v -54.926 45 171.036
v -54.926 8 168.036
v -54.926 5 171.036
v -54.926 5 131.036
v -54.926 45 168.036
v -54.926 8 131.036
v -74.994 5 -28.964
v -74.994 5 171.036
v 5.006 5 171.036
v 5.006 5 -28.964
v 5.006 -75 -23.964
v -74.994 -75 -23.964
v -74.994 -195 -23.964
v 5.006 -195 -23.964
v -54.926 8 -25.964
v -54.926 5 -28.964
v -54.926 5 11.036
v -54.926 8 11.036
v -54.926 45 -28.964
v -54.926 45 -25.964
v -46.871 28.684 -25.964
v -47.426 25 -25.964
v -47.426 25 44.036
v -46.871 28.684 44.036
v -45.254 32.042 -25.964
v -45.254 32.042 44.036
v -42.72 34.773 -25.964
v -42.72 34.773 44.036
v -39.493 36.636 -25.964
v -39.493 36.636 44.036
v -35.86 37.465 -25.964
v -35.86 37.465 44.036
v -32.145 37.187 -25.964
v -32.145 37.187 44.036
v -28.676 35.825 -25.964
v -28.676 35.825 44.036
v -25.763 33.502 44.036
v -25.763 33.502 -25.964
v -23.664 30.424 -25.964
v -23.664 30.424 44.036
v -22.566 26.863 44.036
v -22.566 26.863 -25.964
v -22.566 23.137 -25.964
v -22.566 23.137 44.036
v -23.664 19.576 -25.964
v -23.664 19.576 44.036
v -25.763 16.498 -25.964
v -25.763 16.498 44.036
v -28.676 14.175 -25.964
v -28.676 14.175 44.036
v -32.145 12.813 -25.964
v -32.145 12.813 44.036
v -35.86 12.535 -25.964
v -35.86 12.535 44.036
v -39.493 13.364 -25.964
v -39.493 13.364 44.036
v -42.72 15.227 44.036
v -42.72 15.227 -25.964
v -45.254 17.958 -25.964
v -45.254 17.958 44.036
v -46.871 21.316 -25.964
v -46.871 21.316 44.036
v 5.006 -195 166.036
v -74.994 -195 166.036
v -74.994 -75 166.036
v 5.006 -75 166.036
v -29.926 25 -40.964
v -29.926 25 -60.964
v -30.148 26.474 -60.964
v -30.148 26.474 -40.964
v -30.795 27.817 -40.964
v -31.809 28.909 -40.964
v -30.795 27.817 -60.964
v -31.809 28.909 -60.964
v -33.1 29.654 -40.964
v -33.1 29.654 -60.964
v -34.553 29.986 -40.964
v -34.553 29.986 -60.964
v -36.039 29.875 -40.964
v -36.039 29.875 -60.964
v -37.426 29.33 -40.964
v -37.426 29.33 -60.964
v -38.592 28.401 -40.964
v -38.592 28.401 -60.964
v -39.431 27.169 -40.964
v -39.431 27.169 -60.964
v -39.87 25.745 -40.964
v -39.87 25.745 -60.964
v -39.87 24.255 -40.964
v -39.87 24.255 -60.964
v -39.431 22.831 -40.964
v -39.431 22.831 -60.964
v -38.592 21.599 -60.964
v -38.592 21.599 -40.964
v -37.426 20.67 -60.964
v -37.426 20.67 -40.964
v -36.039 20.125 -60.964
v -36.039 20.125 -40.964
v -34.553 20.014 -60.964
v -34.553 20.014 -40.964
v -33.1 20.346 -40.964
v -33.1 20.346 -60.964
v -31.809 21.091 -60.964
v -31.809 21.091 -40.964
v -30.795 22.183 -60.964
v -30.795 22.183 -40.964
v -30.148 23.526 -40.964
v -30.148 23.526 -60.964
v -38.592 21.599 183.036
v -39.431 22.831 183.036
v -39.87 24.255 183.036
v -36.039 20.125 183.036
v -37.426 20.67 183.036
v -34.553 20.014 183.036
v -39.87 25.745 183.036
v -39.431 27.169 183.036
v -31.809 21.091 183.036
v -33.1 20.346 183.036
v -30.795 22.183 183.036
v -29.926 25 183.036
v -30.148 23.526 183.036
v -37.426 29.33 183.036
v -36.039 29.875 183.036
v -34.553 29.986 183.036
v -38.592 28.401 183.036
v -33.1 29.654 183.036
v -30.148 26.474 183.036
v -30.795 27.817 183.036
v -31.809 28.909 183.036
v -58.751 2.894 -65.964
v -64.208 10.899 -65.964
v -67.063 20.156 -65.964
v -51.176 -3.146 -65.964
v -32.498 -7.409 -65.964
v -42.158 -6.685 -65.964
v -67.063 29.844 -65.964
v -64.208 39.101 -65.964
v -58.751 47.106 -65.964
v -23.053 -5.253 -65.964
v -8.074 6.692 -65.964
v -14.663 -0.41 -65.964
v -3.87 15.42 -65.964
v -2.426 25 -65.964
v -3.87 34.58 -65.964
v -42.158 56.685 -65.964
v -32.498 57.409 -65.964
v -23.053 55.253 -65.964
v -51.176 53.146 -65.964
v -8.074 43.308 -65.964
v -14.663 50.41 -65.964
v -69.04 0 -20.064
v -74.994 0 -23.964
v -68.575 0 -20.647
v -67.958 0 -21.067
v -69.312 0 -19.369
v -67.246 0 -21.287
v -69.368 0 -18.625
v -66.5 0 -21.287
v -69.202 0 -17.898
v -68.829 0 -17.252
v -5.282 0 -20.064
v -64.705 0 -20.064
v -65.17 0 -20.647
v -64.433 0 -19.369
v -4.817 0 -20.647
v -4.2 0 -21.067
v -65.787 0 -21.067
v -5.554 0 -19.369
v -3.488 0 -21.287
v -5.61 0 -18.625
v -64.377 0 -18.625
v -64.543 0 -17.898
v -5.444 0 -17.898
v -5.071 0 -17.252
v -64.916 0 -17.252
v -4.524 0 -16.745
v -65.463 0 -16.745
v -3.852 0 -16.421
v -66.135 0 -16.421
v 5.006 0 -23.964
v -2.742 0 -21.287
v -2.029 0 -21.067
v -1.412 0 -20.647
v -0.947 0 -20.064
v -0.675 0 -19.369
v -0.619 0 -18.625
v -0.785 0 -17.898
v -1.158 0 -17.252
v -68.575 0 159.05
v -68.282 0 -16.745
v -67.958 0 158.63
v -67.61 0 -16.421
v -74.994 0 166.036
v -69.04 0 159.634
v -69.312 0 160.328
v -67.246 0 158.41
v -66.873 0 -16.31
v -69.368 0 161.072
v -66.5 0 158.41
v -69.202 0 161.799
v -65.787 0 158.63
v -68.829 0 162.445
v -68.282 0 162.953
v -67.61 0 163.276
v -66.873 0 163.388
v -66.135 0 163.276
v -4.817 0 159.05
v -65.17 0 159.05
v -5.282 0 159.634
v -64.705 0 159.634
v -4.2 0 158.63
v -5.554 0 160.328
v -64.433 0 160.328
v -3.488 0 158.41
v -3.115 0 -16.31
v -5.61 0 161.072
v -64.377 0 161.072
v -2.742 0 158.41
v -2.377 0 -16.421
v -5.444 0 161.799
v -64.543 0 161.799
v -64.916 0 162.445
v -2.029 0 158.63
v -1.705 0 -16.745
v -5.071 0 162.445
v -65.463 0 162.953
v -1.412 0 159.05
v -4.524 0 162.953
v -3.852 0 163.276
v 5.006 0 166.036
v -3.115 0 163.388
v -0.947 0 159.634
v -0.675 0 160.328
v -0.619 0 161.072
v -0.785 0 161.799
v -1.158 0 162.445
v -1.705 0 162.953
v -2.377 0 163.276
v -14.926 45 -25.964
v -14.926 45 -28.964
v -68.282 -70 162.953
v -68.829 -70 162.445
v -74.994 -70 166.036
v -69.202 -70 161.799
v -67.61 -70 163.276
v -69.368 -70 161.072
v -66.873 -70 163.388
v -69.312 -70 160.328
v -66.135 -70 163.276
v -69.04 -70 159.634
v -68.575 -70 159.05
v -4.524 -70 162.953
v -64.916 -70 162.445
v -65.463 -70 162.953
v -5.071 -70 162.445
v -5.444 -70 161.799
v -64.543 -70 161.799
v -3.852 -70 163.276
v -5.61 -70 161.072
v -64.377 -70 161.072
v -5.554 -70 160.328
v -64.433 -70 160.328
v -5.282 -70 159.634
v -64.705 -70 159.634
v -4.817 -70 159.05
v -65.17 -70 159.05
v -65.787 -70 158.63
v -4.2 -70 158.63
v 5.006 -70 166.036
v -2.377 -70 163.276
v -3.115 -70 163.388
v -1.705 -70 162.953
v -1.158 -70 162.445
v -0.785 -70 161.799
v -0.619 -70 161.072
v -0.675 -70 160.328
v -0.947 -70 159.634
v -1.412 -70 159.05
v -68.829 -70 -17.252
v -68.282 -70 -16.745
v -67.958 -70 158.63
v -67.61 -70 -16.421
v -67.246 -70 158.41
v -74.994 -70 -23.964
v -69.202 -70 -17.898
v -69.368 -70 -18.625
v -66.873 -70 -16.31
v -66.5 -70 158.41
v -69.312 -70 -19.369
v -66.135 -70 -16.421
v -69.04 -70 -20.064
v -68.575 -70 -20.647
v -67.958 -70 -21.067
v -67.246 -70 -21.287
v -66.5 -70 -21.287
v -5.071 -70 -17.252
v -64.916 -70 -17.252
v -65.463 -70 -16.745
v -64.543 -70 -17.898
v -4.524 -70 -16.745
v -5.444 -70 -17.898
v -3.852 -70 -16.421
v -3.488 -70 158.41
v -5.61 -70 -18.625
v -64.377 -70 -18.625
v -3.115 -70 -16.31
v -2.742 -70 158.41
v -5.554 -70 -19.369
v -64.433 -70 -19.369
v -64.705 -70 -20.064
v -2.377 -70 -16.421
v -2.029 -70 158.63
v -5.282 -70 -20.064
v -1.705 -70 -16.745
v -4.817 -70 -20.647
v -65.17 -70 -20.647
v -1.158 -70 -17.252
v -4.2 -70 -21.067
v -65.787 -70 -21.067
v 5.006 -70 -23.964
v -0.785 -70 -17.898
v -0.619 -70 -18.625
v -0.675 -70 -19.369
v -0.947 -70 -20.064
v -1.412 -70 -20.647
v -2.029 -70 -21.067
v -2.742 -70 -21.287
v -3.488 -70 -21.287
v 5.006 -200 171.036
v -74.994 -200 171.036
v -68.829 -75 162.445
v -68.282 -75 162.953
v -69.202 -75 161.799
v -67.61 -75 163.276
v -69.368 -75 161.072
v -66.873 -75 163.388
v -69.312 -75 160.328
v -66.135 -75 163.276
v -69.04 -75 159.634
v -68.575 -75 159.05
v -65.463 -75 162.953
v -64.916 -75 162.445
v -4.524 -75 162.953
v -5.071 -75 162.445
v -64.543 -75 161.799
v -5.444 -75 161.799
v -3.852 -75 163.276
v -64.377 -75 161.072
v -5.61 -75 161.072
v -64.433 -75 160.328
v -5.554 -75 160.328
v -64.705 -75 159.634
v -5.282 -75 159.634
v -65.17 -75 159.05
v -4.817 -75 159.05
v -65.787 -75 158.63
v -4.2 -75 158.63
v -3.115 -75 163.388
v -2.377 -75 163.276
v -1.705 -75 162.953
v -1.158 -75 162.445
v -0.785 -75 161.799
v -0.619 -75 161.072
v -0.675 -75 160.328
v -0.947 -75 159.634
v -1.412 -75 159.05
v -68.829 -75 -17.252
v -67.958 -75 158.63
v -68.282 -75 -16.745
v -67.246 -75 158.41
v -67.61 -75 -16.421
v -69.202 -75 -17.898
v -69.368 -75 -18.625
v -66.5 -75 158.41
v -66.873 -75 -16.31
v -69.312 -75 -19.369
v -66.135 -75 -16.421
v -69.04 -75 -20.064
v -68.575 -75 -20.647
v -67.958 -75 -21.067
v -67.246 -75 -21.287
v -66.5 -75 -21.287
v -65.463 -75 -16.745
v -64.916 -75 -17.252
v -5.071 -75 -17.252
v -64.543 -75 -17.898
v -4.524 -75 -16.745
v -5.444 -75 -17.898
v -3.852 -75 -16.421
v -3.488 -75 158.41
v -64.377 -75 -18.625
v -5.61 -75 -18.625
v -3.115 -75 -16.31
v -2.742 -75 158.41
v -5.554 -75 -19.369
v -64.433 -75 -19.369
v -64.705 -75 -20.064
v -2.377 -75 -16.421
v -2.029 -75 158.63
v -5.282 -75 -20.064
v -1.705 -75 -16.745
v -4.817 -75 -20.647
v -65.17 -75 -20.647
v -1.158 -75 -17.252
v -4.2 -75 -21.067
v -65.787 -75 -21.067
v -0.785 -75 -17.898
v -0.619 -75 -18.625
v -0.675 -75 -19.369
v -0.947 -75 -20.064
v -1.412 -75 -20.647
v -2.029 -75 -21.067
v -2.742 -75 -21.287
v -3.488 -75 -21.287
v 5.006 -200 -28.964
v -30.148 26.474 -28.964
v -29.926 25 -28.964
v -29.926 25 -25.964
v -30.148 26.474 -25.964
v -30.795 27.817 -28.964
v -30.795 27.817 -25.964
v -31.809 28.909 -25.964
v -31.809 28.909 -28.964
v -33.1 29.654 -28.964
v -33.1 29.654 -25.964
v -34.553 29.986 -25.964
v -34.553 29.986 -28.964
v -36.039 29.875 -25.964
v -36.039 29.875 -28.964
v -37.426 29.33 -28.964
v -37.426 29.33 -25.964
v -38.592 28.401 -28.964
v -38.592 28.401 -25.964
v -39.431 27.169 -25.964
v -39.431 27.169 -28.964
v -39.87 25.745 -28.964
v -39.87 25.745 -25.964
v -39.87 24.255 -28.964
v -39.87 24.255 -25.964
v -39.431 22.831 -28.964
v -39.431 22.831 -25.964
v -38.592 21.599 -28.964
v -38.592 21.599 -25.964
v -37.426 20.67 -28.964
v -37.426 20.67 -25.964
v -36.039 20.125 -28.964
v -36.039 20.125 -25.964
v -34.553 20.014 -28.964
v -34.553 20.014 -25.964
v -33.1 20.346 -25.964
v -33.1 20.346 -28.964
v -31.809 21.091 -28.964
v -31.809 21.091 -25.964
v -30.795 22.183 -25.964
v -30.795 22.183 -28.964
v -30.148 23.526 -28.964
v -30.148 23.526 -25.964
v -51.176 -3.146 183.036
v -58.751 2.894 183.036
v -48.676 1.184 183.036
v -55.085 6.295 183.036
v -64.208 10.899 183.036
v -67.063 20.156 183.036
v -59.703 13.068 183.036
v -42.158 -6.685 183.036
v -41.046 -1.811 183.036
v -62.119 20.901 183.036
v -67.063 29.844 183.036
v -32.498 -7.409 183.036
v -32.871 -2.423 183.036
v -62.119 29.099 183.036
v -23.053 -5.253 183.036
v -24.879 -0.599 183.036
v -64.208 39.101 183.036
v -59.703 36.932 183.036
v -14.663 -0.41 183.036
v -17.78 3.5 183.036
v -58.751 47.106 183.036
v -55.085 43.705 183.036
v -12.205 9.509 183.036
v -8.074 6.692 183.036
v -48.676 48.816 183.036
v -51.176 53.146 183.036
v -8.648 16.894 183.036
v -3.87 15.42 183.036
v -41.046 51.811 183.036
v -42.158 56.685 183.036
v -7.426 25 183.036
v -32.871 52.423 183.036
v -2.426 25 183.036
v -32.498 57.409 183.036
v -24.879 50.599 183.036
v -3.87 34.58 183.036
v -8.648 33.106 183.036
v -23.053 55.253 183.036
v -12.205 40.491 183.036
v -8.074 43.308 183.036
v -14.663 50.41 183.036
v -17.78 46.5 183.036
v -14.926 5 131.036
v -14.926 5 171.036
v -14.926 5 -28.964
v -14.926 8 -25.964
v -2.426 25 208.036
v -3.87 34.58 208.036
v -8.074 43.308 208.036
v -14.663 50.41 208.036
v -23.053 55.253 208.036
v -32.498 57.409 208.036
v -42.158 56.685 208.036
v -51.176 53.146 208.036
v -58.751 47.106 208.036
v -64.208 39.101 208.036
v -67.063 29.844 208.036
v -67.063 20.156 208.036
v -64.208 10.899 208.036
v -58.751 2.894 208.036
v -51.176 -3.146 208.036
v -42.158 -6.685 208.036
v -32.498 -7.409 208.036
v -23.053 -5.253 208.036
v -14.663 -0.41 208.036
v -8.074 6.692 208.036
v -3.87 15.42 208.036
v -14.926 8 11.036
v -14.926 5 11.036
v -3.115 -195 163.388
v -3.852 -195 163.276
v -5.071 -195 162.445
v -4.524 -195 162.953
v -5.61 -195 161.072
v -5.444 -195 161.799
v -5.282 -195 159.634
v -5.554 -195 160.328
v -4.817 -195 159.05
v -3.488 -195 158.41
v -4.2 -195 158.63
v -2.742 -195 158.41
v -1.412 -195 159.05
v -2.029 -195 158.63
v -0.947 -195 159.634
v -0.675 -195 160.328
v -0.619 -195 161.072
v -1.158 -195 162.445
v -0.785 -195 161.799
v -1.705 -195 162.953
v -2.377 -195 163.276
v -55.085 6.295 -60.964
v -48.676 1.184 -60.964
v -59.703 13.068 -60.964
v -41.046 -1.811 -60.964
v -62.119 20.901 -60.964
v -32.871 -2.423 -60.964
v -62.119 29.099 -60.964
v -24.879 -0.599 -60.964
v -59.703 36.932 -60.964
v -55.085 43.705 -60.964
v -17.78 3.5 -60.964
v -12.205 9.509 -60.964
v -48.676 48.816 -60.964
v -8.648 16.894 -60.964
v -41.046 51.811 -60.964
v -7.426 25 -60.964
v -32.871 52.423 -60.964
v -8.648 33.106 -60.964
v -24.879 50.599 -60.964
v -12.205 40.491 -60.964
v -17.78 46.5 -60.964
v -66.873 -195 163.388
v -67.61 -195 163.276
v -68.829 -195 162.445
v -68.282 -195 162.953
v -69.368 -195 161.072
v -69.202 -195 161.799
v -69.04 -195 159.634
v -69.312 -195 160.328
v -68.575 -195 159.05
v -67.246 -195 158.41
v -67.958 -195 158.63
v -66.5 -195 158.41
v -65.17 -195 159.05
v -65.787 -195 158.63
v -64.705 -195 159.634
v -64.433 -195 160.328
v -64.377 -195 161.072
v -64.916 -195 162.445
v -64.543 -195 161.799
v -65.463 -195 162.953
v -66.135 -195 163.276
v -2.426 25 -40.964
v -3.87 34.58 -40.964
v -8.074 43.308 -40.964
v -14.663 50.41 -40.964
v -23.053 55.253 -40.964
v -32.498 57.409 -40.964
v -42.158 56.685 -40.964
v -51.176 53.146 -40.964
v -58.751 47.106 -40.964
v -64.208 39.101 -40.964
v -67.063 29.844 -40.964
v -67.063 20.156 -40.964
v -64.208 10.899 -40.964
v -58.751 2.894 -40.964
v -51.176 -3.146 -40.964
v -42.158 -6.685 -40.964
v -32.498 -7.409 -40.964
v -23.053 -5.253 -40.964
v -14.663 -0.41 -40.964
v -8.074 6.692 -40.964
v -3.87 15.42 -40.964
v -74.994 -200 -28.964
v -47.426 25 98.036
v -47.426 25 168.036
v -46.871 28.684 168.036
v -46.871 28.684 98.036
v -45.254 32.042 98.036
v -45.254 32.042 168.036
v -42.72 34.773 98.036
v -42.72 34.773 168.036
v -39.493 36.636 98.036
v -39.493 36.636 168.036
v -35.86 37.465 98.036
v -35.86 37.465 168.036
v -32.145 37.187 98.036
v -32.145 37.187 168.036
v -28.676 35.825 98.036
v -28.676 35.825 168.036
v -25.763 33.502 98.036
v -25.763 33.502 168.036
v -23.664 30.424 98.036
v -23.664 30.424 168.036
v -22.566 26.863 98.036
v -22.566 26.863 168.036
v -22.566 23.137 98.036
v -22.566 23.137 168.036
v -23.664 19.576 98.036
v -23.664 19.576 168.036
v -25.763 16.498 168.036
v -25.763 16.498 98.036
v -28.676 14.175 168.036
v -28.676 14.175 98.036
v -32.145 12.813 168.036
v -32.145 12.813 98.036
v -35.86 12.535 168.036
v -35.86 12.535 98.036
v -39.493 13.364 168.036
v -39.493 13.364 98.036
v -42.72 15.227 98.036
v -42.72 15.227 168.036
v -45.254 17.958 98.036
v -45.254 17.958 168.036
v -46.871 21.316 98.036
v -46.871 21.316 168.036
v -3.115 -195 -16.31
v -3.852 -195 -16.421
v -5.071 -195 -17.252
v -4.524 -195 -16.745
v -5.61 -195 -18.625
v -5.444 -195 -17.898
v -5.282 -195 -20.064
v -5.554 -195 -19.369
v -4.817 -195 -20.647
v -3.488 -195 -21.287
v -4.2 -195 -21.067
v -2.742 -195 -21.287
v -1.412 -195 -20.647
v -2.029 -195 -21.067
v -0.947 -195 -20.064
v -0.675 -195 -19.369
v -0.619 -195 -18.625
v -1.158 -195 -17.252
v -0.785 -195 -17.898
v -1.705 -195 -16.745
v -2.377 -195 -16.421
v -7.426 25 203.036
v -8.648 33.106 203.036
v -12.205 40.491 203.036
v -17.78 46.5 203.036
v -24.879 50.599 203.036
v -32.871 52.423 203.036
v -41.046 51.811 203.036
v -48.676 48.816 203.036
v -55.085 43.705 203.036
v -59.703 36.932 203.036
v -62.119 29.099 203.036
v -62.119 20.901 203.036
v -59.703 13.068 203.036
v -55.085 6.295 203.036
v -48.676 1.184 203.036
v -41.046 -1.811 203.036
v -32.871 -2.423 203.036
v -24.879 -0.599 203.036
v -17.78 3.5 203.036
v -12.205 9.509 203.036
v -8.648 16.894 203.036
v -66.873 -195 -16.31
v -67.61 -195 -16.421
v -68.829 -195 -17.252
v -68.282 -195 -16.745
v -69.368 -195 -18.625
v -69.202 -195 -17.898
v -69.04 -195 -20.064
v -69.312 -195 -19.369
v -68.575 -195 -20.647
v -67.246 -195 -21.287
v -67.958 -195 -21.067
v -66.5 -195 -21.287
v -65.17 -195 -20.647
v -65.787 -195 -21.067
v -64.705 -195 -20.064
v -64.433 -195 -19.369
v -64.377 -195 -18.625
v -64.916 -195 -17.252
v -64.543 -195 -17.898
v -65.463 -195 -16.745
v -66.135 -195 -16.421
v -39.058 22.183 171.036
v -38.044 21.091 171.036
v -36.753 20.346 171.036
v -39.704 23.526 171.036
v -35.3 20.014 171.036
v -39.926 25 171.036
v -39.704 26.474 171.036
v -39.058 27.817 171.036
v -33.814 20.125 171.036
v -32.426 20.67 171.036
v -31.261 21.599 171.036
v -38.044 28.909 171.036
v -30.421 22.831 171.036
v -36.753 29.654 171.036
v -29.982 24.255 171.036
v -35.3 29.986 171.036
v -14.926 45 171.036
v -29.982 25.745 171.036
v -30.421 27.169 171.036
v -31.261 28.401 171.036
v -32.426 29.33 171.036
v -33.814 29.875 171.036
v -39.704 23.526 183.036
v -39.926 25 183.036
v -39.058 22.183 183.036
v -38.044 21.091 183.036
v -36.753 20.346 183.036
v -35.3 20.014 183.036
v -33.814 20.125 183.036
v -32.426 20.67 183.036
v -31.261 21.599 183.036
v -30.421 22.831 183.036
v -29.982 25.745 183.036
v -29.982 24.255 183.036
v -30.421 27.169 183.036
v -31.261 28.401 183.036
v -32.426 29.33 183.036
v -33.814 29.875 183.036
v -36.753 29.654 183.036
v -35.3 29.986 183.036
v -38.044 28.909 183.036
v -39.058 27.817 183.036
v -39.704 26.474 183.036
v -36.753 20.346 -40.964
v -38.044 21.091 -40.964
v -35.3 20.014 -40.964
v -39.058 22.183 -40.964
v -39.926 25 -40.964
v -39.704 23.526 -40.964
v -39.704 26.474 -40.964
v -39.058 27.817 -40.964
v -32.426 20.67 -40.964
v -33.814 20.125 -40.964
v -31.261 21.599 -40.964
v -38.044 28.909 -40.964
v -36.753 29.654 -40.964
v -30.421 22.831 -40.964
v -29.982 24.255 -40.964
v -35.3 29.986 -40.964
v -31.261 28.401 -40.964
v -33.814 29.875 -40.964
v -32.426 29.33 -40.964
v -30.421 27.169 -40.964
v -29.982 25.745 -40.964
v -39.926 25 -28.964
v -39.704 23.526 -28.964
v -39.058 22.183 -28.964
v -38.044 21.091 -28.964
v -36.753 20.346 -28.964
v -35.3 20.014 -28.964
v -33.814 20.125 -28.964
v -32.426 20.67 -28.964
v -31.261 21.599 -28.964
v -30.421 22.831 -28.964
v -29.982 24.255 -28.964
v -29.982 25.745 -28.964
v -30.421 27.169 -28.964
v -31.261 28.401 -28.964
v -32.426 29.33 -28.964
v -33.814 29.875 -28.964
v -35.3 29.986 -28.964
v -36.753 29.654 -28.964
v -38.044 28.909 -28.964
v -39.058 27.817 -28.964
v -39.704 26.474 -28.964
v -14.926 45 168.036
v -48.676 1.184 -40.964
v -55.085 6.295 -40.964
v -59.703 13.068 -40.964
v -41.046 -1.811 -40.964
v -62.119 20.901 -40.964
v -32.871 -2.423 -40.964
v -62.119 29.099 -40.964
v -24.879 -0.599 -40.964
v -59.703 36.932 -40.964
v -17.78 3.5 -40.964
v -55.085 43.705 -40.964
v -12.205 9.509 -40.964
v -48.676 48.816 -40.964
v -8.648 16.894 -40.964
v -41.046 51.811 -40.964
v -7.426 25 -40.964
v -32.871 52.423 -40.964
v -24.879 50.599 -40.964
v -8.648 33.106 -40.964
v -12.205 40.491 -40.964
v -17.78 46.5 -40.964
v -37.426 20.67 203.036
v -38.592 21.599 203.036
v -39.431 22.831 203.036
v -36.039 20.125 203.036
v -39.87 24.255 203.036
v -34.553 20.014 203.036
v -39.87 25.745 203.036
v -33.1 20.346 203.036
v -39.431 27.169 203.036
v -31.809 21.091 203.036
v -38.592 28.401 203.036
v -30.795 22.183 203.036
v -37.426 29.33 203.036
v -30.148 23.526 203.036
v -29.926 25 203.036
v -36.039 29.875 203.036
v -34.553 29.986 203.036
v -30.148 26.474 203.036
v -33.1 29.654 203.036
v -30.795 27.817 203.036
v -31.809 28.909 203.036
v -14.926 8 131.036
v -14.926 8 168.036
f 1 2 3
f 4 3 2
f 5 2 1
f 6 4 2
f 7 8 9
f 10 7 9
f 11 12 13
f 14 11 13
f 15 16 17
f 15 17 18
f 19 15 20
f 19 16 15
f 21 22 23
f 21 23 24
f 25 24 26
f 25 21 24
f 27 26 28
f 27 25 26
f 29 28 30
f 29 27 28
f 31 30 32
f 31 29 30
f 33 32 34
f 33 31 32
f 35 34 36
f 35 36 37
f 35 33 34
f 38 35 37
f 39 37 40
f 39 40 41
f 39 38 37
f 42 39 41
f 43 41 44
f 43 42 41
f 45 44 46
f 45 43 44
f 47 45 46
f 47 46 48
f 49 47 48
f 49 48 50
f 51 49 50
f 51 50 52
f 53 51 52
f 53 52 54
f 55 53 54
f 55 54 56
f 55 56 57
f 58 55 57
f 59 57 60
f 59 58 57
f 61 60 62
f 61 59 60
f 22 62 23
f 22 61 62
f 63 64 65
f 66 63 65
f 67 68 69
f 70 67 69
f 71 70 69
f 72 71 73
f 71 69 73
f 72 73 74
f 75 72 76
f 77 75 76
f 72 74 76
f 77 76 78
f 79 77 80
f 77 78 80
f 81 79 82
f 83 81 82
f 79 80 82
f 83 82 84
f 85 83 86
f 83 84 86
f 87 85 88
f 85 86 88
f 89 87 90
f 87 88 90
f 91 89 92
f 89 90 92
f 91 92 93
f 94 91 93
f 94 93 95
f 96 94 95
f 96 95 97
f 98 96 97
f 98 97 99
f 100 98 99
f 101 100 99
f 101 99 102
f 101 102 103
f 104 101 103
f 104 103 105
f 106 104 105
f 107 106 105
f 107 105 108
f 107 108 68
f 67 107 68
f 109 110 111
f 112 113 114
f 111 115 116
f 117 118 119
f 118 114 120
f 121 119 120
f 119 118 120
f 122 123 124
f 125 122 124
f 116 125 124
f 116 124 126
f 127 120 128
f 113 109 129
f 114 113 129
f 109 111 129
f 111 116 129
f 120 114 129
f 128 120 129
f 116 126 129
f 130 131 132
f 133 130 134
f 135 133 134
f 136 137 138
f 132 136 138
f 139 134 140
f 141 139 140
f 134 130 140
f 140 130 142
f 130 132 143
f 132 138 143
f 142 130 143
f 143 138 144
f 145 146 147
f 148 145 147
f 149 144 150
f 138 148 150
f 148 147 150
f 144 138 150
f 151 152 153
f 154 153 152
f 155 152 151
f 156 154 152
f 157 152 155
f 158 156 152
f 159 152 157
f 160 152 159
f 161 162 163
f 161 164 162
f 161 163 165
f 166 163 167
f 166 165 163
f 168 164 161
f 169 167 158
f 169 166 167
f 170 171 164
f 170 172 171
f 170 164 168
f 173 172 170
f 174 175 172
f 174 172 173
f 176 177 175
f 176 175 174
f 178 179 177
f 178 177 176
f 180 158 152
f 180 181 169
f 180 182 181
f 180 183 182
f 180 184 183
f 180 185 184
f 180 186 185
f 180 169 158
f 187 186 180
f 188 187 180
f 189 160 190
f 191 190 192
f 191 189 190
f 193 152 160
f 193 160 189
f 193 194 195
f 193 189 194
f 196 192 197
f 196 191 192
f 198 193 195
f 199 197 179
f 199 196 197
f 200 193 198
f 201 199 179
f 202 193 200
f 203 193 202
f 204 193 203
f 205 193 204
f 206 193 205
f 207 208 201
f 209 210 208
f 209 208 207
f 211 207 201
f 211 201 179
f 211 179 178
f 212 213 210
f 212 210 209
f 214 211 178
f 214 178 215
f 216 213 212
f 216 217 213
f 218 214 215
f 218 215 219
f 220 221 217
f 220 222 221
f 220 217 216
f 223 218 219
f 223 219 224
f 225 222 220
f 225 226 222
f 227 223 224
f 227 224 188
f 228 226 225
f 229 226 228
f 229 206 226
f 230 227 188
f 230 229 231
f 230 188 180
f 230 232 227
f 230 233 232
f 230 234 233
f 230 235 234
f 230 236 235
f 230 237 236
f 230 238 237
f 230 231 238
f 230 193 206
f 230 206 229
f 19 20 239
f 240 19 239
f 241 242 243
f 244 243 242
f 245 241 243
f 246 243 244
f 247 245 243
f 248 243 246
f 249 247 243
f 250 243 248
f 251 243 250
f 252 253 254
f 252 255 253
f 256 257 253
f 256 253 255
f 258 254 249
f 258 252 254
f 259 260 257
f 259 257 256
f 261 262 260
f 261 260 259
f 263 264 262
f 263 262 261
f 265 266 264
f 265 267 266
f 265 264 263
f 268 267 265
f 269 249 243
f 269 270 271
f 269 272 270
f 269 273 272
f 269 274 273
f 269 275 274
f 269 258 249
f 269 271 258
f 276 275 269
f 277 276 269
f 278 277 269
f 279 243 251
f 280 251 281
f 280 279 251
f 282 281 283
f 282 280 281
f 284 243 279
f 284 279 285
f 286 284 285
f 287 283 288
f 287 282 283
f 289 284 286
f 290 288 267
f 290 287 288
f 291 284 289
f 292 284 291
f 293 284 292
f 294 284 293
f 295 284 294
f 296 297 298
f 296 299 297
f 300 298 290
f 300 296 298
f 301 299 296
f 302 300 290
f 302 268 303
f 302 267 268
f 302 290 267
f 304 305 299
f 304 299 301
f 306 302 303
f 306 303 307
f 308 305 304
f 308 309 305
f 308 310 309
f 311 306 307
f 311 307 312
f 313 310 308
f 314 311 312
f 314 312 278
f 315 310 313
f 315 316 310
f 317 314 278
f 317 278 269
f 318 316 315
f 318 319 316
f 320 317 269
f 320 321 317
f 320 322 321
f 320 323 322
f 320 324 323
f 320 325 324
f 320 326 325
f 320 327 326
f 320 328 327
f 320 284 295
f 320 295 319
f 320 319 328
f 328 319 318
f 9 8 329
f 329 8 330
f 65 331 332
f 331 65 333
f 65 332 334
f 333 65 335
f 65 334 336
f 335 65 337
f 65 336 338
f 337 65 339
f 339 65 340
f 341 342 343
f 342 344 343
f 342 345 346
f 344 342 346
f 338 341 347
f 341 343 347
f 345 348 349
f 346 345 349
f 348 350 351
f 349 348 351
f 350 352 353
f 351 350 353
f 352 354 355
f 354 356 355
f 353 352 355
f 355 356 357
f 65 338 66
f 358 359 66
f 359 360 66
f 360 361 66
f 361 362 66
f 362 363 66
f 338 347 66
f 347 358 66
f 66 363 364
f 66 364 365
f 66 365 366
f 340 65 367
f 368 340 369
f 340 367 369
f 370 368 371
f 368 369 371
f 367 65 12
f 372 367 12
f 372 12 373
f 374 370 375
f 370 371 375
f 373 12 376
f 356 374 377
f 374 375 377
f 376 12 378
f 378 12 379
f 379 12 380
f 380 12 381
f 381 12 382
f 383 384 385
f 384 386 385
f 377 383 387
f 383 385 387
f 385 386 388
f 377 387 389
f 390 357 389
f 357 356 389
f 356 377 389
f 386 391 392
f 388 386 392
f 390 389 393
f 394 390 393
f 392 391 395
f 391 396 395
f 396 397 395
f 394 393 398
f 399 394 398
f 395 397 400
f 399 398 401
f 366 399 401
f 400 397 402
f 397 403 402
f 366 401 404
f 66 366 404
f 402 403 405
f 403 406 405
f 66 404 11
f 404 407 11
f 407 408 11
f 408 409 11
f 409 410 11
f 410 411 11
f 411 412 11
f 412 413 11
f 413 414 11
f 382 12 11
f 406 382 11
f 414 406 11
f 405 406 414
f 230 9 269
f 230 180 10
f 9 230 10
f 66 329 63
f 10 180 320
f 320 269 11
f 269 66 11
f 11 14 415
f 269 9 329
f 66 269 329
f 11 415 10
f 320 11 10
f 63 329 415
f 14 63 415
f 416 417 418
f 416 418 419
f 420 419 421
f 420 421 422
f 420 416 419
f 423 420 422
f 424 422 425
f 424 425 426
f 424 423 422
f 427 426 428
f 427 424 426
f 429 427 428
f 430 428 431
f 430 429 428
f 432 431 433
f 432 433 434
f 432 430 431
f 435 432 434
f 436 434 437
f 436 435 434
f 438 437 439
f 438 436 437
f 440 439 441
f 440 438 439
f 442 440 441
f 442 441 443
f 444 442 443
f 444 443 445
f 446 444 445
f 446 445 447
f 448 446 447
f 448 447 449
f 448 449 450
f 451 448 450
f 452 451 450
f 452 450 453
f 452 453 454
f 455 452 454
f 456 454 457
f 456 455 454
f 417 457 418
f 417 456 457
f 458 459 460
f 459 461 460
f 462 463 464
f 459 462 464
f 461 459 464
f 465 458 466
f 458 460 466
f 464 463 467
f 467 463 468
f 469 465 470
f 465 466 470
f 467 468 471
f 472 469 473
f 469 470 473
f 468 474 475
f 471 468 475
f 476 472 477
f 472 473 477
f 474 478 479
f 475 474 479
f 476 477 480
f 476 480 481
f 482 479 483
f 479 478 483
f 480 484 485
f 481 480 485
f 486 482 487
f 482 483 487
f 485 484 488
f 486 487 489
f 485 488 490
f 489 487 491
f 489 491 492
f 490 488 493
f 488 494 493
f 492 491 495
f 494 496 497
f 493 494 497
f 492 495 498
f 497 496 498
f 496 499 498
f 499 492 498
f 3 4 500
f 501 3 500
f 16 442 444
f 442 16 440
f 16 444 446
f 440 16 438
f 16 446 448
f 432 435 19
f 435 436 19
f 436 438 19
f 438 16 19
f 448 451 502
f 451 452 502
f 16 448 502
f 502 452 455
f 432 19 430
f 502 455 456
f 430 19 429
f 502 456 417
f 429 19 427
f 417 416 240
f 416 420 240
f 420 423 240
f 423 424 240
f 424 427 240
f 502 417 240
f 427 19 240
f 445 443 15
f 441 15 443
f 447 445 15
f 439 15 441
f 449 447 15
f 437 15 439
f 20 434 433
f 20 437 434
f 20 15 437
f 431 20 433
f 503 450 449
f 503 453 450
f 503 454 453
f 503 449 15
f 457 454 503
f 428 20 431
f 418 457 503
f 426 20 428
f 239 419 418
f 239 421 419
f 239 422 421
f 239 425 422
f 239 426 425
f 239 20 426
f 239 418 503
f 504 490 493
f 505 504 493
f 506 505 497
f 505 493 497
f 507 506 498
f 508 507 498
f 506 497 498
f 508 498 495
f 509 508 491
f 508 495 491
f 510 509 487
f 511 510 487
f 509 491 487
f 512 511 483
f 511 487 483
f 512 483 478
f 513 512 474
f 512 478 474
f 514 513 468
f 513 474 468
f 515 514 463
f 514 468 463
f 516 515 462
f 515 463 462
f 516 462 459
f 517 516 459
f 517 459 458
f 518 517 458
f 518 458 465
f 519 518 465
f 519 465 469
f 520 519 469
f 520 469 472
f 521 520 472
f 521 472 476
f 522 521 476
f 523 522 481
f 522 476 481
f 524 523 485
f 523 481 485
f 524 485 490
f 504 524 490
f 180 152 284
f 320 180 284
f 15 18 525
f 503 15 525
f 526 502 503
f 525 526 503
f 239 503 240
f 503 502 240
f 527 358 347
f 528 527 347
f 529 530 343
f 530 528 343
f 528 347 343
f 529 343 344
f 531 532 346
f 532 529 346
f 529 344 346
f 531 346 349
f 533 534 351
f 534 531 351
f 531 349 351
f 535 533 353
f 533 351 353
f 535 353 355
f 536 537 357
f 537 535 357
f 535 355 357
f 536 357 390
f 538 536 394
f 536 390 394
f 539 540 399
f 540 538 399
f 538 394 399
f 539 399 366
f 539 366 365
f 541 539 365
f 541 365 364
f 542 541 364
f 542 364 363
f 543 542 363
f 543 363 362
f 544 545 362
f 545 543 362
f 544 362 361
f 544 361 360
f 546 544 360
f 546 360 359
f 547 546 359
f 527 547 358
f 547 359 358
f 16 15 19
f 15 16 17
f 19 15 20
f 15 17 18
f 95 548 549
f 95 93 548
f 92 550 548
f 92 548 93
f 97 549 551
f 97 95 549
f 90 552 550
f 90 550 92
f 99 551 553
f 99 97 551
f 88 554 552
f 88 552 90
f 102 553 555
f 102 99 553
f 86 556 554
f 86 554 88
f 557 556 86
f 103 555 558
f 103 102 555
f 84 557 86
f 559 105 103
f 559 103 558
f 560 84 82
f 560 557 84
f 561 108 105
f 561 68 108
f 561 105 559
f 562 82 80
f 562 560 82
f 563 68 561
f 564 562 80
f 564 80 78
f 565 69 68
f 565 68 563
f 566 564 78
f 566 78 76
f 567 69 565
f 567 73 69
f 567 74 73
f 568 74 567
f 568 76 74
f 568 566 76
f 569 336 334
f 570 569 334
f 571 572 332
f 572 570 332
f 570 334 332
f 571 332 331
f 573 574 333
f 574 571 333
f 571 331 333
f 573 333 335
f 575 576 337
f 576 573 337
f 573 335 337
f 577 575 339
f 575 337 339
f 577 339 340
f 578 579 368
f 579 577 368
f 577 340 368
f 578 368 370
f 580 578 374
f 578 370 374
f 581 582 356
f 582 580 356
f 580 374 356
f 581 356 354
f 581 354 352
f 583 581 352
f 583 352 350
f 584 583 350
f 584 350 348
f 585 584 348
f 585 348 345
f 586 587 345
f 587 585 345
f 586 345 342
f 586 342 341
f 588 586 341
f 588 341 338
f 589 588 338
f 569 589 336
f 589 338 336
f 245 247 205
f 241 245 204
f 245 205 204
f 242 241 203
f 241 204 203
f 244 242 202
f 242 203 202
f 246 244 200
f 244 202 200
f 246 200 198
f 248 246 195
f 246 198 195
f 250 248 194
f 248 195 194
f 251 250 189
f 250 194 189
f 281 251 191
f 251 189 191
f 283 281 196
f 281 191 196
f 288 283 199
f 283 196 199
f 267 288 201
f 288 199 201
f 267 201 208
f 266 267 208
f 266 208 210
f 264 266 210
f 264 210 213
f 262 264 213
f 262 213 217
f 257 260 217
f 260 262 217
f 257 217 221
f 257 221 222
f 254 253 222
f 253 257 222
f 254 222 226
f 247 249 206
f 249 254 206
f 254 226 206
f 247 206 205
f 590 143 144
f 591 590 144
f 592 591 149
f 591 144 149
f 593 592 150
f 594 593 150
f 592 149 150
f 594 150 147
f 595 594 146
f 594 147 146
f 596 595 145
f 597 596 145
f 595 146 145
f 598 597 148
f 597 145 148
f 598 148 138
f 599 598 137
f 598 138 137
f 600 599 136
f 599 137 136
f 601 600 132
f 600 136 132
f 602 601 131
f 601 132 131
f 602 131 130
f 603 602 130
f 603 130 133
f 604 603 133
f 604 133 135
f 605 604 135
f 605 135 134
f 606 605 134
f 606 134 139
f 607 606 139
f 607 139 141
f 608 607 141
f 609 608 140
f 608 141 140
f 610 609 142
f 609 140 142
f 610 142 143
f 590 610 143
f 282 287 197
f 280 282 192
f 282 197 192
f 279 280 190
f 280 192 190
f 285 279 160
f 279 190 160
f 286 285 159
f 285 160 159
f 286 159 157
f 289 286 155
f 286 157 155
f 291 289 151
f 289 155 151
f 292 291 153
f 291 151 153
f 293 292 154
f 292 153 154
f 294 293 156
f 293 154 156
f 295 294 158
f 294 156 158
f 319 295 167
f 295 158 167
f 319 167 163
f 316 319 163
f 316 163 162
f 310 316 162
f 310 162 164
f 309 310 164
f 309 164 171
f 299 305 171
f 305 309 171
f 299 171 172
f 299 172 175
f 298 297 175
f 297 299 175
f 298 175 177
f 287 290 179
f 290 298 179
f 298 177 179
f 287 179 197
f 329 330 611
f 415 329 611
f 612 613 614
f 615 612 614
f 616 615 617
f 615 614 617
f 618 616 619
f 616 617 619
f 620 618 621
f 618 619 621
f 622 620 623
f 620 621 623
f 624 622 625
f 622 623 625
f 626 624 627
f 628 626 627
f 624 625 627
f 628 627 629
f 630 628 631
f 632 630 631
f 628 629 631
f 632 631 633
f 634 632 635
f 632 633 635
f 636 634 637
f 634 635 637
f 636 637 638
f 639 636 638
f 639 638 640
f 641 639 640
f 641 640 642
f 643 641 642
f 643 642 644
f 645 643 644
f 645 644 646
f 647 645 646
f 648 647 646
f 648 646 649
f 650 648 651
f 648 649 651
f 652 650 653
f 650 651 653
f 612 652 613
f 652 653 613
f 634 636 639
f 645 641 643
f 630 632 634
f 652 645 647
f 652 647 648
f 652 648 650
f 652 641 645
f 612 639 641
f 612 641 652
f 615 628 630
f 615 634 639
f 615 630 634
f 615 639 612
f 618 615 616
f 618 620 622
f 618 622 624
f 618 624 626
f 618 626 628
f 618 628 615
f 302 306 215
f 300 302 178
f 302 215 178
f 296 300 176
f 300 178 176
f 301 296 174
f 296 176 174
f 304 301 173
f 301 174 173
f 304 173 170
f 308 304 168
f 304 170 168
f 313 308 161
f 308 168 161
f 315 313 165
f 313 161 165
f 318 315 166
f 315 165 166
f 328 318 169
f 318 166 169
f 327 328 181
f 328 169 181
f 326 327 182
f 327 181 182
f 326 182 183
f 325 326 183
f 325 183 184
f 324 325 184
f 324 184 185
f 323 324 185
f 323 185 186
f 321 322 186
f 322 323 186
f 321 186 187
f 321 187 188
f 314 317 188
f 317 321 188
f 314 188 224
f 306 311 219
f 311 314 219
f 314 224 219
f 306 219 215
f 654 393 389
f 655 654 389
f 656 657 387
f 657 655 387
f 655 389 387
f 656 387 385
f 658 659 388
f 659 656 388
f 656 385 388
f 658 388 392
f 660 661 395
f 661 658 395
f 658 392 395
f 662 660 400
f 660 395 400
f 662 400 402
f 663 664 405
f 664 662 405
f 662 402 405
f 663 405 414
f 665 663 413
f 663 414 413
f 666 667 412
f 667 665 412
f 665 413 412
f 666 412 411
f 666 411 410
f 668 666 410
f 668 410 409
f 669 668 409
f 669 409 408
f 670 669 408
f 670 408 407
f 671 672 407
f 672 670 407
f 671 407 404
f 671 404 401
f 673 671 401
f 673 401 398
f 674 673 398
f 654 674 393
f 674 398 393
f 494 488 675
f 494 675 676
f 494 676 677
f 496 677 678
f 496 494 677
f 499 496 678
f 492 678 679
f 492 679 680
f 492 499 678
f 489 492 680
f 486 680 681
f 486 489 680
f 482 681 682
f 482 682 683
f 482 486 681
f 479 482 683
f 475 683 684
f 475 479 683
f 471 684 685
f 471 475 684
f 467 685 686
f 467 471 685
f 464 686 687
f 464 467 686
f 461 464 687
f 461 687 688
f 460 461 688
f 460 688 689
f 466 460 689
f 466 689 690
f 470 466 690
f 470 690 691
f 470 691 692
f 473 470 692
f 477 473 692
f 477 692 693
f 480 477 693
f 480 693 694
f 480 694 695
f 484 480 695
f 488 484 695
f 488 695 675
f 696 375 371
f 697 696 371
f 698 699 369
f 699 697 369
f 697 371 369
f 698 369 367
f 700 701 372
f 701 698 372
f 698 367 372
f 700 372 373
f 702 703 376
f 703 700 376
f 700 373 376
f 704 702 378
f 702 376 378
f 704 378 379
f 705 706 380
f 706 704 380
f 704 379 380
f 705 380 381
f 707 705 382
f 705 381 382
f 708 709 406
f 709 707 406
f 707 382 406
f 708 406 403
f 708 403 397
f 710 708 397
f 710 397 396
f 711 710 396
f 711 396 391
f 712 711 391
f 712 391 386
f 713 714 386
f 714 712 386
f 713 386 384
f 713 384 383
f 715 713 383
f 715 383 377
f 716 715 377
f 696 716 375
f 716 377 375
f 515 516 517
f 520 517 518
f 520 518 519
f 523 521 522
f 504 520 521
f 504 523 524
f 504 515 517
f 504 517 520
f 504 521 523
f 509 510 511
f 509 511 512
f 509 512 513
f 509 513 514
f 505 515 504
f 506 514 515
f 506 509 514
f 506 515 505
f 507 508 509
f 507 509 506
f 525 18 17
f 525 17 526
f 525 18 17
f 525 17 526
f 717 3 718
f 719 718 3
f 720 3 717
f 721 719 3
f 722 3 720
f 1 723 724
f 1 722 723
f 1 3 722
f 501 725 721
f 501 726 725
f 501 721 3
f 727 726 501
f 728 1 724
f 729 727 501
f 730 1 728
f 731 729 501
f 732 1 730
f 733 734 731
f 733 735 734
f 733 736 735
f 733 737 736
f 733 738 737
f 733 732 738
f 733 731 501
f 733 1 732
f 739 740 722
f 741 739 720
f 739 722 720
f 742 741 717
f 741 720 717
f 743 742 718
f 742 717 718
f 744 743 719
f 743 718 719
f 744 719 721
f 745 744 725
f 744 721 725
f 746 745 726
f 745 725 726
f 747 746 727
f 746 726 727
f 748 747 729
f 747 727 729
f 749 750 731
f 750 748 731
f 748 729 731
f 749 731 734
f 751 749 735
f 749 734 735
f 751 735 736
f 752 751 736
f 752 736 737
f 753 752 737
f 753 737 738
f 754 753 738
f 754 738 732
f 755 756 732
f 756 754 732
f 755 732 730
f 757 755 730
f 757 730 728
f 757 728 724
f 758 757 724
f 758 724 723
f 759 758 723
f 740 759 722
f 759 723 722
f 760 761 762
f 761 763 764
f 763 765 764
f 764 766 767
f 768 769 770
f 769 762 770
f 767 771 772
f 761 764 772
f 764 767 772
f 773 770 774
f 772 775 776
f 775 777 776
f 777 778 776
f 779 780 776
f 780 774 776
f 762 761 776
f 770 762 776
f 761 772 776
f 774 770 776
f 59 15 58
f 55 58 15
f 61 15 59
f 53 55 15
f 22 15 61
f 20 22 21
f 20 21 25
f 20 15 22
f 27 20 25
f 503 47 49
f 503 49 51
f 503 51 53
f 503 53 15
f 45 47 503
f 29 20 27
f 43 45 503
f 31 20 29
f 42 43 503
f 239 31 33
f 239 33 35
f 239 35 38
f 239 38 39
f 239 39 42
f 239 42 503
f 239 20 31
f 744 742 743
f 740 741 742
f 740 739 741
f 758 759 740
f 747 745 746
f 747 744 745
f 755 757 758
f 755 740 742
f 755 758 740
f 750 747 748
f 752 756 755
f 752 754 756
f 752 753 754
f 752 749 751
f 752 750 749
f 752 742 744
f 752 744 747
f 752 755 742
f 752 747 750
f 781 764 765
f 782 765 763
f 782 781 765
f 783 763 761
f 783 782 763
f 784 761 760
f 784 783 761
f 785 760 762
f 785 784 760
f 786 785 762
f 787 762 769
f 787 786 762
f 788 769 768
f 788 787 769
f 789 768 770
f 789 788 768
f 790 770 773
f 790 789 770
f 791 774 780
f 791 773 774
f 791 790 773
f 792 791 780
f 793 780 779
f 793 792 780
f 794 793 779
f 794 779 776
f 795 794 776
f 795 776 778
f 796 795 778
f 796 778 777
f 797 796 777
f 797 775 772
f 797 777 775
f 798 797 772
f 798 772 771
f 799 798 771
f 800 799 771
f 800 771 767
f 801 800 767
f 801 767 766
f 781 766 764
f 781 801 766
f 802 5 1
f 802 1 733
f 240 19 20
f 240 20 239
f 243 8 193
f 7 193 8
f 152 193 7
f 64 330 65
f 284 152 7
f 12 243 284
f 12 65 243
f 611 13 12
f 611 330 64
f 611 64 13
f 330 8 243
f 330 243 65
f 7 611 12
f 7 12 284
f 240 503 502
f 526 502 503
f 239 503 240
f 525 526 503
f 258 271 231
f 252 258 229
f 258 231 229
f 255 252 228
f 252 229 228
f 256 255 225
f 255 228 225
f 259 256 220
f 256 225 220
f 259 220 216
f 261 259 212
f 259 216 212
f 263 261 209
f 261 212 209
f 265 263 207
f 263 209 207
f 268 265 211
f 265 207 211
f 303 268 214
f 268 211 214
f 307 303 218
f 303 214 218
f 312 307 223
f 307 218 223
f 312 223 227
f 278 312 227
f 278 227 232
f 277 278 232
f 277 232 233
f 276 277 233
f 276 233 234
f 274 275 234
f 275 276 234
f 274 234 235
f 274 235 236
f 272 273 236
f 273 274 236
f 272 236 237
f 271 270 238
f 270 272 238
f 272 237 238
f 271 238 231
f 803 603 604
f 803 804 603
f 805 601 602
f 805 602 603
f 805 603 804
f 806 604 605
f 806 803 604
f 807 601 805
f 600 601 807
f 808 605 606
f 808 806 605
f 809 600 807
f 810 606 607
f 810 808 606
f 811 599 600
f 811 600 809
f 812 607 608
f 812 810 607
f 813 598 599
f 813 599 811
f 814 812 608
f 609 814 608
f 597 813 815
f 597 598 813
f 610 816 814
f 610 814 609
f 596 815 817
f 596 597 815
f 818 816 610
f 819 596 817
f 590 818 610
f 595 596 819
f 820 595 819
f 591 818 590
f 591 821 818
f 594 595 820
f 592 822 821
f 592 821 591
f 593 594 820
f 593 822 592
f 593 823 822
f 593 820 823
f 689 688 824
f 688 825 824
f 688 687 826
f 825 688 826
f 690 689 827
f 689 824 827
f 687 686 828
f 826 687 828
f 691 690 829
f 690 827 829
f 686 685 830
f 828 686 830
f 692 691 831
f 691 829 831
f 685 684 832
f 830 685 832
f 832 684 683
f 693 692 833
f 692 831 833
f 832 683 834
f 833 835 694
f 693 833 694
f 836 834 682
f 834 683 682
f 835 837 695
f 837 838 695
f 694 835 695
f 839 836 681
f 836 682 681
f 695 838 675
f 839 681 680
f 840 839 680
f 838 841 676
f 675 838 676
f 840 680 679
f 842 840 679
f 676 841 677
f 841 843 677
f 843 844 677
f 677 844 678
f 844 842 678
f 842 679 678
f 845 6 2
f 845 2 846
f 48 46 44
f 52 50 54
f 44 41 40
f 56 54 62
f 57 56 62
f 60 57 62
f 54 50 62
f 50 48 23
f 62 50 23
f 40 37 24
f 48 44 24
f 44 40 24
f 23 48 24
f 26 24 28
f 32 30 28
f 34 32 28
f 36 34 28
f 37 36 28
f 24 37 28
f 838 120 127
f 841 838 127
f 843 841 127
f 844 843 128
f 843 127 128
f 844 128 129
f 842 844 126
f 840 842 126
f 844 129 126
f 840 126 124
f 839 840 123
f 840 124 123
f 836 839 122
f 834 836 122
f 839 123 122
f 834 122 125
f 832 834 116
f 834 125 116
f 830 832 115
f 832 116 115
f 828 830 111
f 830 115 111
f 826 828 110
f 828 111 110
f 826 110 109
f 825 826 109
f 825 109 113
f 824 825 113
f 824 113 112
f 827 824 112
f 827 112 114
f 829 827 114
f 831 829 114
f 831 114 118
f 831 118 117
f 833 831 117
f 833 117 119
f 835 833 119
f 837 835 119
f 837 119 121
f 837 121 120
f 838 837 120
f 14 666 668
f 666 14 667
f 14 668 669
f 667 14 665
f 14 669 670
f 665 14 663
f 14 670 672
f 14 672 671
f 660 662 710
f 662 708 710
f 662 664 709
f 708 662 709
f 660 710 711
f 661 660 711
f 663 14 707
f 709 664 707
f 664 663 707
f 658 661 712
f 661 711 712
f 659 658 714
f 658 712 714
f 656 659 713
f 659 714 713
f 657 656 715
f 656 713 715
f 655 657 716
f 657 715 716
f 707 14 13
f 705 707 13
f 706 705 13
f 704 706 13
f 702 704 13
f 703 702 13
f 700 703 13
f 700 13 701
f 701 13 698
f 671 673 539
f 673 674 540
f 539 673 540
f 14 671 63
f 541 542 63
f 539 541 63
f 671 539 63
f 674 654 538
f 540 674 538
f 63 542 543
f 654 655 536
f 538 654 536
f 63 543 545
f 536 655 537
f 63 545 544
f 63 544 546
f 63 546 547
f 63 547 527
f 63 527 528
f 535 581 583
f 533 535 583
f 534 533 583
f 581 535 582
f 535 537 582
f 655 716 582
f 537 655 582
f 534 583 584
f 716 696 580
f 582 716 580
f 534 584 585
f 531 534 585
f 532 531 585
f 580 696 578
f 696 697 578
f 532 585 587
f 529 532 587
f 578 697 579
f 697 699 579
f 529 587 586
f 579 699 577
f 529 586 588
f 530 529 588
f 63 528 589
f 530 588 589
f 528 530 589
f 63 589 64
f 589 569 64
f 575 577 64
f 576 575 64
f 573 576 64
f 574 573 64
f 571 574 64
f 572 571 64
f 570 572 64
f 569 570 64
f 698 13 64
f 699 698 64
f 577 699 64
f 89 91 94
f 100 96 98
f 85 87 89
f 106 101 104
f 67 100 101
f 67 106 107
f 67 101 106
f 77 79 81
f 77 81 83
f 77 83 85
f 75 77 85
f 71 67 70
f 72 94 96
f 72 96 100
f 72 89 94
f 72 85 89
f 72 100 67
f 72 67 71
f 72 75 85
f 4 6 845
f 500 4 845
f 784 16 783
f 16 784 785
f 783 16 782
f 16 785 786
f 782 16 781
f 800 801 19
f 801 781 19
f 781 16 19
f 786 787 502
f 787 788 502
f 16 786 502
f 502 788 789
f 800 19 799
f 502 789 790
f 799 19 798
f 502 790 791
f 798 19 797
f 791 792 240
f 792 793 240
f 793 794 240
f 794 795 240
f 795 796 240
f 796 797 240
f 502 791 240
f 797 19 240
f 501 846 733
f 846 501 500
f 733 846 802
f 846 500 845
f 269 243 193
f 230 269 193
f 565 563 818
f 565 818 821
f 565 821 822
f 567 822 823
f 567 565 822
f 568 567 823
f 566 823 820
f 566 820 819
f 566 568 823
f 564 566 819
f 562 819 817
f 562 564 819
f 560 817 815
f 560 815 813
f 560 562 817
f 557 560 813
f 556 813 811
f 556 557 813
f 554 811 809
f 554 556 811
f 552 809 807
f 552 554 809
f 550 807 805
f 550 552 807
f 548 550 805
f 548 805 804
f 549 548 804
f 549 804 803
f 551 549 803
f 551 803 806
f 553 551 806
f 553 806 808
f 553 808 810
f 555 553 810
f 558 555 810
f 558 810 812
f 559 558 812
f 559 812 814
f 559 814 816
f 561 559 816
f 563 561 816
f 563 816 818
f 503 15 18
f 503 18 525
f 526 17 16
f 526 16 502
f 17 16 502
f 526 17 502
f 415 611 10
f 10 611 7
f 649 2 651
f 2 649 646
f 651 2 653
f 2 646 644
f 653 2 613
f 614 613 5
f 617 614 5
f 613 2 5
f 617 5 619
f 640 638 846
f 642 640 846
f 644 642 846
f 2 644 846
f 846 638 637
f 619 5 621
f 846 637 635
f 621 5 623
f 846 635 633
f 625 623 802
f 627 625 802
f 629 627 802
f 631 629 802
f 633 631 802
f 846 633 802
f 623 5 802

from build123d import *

# Parameters (mm, degrees)
SKETCH1_W            = 80
SKETCH1_H            = 100
BOSS_EXTRUDE1_DEPTH  = 5
SKETCH2_W            = 40
SKETCH2_H            = 40
BOSS_EXTRUDE2_DEPTH  = 40
SHELL2_START         = -25.963680664
SHELL2_OUTLINE_W     = 40
SHELL2_OUTLINE_H     = 37
SHELL2_DEPTH         = 37
SKETCH4_R            = 5
CUT_EXTRUDE2_DEPTH   = 3
SPLIT1_START         = 5
SPLIT1_OUTLINE_W     = 40
SPLIT1_OUTLINE_H     = 40
SPLIT1_DEPTH         = 40
SPLIT1_START_2       = -28.963680664
SPLIT1_2_OUTLINE_W   = 40
SPLIT1_2_OUTLINE_H   = 3
SPLIT1_2_DEPTH       = 40
SPLIT1_3_OUTLINE_W   = 40
SPLIT1_3_OUTLINE_H   = 37
SPLIT1_3_OUTLINE_R   = 5
SPLIT1_3_DEPTH       = 3
SPLIT1_START_3       = 131.036319336
SPLIT1_4_OUTLINE_W   = 40
SPLIT1_4_OUTLINE_H   = 3
SPLIT1_4_DEPTH       = 40
SPLIT1_START_4       = 168.036319336
SPLIT1_5_OUTLINE_W   = 40
SPLIT1_5_OUTLINE_H   = 37
SPLIT1_5_OUTLINE_R   = 5
SPLIT1_5_DEPTH       = 3
SKETCH7_R            = 12.5
BOSS_EXTRUDE3_DEPTH  = 70
SKETCH8_R            = 5
BOSS_EXTRUDE4_DEPTH  = 25
SKETCH9_R            = 32.5
BOSS_EXTRUDE9_DEPTH  = 10
SKETCH13_R           = 32.5
BOSS_EXTRUDE10_DEPTH = 15
SKETCH14_R           = 27.5
SKETCH14_R_2         = 5
CUT_EXTRUDE4_DEPTH   = 20
SPLIT2_START         = -65.963680664
SPLIT2_OUTLINE_R     = 32.5
SPLIT2_OUTLINE_R_2   = 27.5
SPLIT2_OUTLINE_R_3   = 5
SPLIT2_DEPTH         = 25
SPLIT2_2_OUTLINE_R   = 27.5
SPLIT2_2_OUTLINE_R_2 = 5
SPLIT2_2_DEPTH       = 5
SPLIT2_3_OUTLINE_R   = 32.5
SPLIT2_3_DEPTH       = 25
SPLIT2_START_2       = 183.036319336
SPLIT2_4_OUTLINE_R   = 32.5
SPLIT2_4_OUTLINE_R_2 = 27.5
SPLIT2_4_OUTLINE_R_3 = 5
SPLIT2_4_DEPTH       = 25
SPLIT2_START_3       = 203.036319336
SPLIT2_5_OUTLINE_R   = 27.5
SPLIT2_5_OUTLINE_R_2 = 5
SPLIT2_5_DEPTH       = 5
SPLIT2_6_OUTLINE_R   = 32.5
SPLIT2_6_DEPTH       = 25
SKETCH18_R           = 2.502634572
BOSS_EXTRUDE11_DEPTH = 200
EXTRUDE_THIN2_DEPTH  = 80
BOSS_EXTRUDE21_START = 120
SKETCH45_W           = 80
SKETCH45_H           = 190
BOSS_EXTRUDE21_DEPTH = 5


# Read off the part's stored shape, not the designer's step: Shell2, Split1, Split2
with BuildPart() as part:
    # Sketch1 → Boss-Extrude1 (new body)
    with BuildSketch(Plane(origin=(0, 0, 0), x_dir=(1, 0, 0), z_dir=(0, 1, 0))):
        with Locations((-34.993542676, -21.036319336)):
            Rectangle(SKETCH1_W, SKETCH1_H)
    extrude(amount=BOSS_EXTRUDE1_DEPTH)

    # Sketch2 → Boss-Extrude2 (add)
    with BuildSketch(Plane(origin=(0, 5, 0), x_dir=(1, 0, 0), z_dir=(0, 1, 0))):
        with Locations((-34.926329237, 8.963680664)):
            Rectangle(SKETCH2_W, SKETCH2_H)
    extrude(amount=BOSS_EXTRUDE2_DEPTH)

    # Shell2 outline → Shell2 (cut)
    with BuildSketch(Plane.XY.offset(SHELL2_START)):
        with Locations((-34.926329237, 26.5)):
            Rectangle(SHELL2_OUTLINE_W, SHELL2_OUTLINE_H)
    extrude(amount=SHELL2_DEPTH, mode=Mode.SUBTRACT)

    # Sketch4 → Cut-Extrude2 (cut)
    with BuildSketch(Plane(origin=(0, 0, -28.963680664), x_dir=(-1, 0, 0), z_dir=(0, 0, -1))):
        with Locations((34.926329237, 25)):
            Circle(SKETCH4_R)
    extrude(amount=-CUT_EXTRUDE2_DEPTH, mode=Mode.SUBTRACT)

    # Mirror1: part across plane


with BuildPart() as part_1:
    add(part.part)
    add(part.part.mirror(Plane.XY.offset(71.036319336)))

    # Split1 outline → Split1 (cut)
    with BuildSketch(Plane(origin=(0, 0, 0), x_dir=(1, 0, 0), z_dir=(0, 1, 0)).offset(SPLIT1_START)):
        with Locations((-34.926329237, 8.963680664)):
            Rectangle(SPLIT1_OUTLINE_W, SPLIT1_OUTLINE_H)
        with Locations((-34.926329237, -151.036319336)):
            Rectangle(SPLIT1_OUTLINE_W, SPLIT1_OUTLINE_H)
    extrude(amount=SPLIT1_DEPTH, mode=Mode.SUBTRACT)

    # Sketch18 → Boss-Extrude11 (add)
    with BuildSketch(Plane(origin=(0, 0, 0), x_dir=(-1, 0, 0), z_dir=(0, -1, 0))):
        with Locations(Location((3.114578294, -160.885024814, 0), (0, 0, 270))):
            Circle(SKETCH18_R)
        with Locations(Location((3.114578294, 18.812386141, 0), (0, 0, 270))):
            Circle(SKETCH18_R)
        with Locations(Location((66.872507057, 18.812386141, 0), (0, 0, 270))):
            Circle(SKETCH18_R)
        with Locations(Location((66.872507057, -160.885024814, 0), (0, 0, 270))):
            Circle(SKETCH18_R)
    extrude(amount=BOSS_EXTRUDE11_DEPTH)

    # Sketch20 → Extrude-Thin2 (add, through all)
    with BuildSketch(Plane.ZY.offset(74.993542676)):
        Polygon((171.036319336, 0), (171.036319336, -200), (-28.963680664, -200), (-28.963680664, 0), (-23.963680664, 0), (-23.963680664, -195), (166.036319336, -195), (166.036319336, 0), align=None)
    extrude(amount=-EXTRUDE_THIN2_DEPTH)

    # Sketch45 → Boss-Extrude21 (add)
    with BuildSketch(Plane(origin=(0, -195, 0), x_dir=(1, 0, 0), z_dir=(0, 1, 0)).offset(BOSS_EXTRUDE21_START)):
        with Locations((-34.993542676, -71.036319336)):
            Rectangle(SKETCH45_W, SKETCH45_H)
    extrude(amount=BOSS_EXTRUDE21_DEPTH)


with BuildPart() as body_2:
    # Split1 2 outline → Split1 2 (new body)
    with BuildSketch(Plane.XY.offset(SPLIT1_START_2)):
        with Locations((-34.926329237, 6.5)):
            Rectangle(SPLIT1_2_OUTLINE_W, SPLIT1_2_OUTLINE_H)
    extrude(amount=SPLIT1_2_DEPTH)

    # Split1 3 outline → Split1 3 (add)
    with BuildSketch(Plane.XY.offset(SPLIT1_START_2)):
        with Locations((-34.926329237, 26.5)):
            Rectangle(SPLIT1_3_OUTLINE_W, SPLIT1_3_OUTLINE_H)
        with Locations((-34.926329237, 25)):
            Circle(SPLIT1_3_OUTLINE_R, mode=Mode.SUBTRACT)
    extrude(amount=SPLIT1_3_DEPTH)


with BuildPart() as body_3:
    # Split1 4 outline → Split1 4 (new body)
    with BuildSketch(Plane.XY.offset(SPLIT1_START_3)):
        with Locations((-34.926329237, 6.5)):
            Rectangle(SPLIT1_4_OUTLINE_W, SPLIT1_4_OUTLINE_H)
    extrude(amount=SPLIT1_4_DEPTH)

    # Split1 5 outline → Split1 5 (add)
    with BuildSketch(Plane.XY.offset(SPLIT1_START_4)):
        with Locations((-34.926329237, 26.5)):
            Rectangle(SPLIT1_5_OUTLINE_W, SPLIT1_5_OUTLINE_H)
        with Locations((-34.926329237, 25)):
            Circle(SPLIT1_5_OUTLINE_R, mode=Mode.SUBTRACT)
    extrude(amount=SPLIT1_5_DEPTH)

    # Sketch7 → Boss-Extrude3 (add)
    with BuildSketch(Plane(origin=(0, 0, 168.036319336), x_dir=(-1, 0, 0), z_dir=(0, 0, -1))):
        with Locations((34.926329237, 25)):
            Circle(SKETCH7_R)
    extrude(amount=BOSS_EXTRUDE3_DEPTH)

    # Sketch8 → Boss-Extrude4 (add)
    with BuildSketch(Plane.XY.offset(168.036319336)):
        with Locations(Location((-34.926329237, 25, 0), (0, 0, 180))):
            Circle(SKETCH8_R)
    extrude(amount=BOSS_EXTRUDE4_DEPTH)

    # Sketch9 → Boss-Extrude9 (add)
    with BuildSketch(Plane.XY.offset(193.036319336)):
        with Locations((-34.926329237, 25)):
            Circle(SKETCH9_R)
    extrude(amount=-BOSS_EXTRUDE9_DEPTH)

    # Sketch13 → Boss-Extrude10 (add)
    with BuildSketch(Plane.XY.offset(193.036319336)):
        with Locations((-34.926329237, 25)):
            Circle(SKETCH13_R)
    extrude(amount=BOSS_EXTRUDE10_DEPTH)

    # Sketch14 → Cut-Extrude4 (cut)
    with BuildSketch(Plane(origin=(0, 0, 183.036319336), x_dir=(-1, 0, 0), z_dir=(0, 0, -1))):
        with Locations((34.926329237, 25)):
            Circle(SKETCH14_R)
        with Locations((34.926329237, 25)):
            Circle(SKETCH14_R_2, mode=Mode.SUBTRACT)
    extrude(amount=-CUT_EXTRUDE4_DEPTH, mode=Mode.SUBTRACT)


with BuildPart() as body_4:
    # Mirror2: mirrored copy
    add(body_3.part.mirror(Plane.XY.offset(71.036319336)))

    # Split2 3 outline → Split2 3 (cut)
    with BuildSketch(Plane.XY.offset(SPLIT2_START)):
        with Locations((-34.926329237, 25)):
            Circle(SPLIT2_3_OUTLINE_R)
    extrude(amount=SPLIT2_3_DEPTH, mode=Mode.SUBTRACT)


with BuildPart() as body_5:
    # Split2 outline → Split2 (new body)
    # profile 1 of 2: a face of its own
    with BuildSketch(Plane.XY.offset(SPLIT2_START)):
        with Locations((-34.926329237, 25)):
            Circle(SPLIT2_OUTLINE_R)
        with Locations((-34.926329237, 25)):
            Circle(SPLIT2_OUTLINE_R_2, mode=Mode.SUBTRACT)
    # profile 2 of 2: a face of its own
    with BuildSketch(Plane.XY.offset(SPLIT2_START)):
        with Locations((-34.926329237, 25)):
            Circle(SPLIT2_OUTLINE_R_3)
    extrude(amount=SPLIT2_DEPTH)

    # Split2 2 outline → Split2 2 (add)
    with BuildSketch(Plane.XY.offset(SPLIT2_START)):
        with Locations((-34.926329237, 25)):
            Circle(SPLIT2_2_OUTLINE_R)
        with Locations((-34.926329237, 25)):
            Circle(SPLIT2_2_OUTLINE_R_2, mode=Mode.SUBTRACT)
    extrude(amount=SPLIT2_2_DEPTH)


with BuildPart() as body_6:
    # Split2 4 outline → Split2 4 (new body)
    # profile 1 of 2: a face of its own
    with BuildSketch(Plane.XY.offset(SPLIT2_START_2)):
        with Locations((-34.926329237, 25)):
            Circle(SPLIT2_4_OUTLINE_R)
        with Locations((-34.926329237, 25)):
            Circle(SPLIT2_4_OUTLINE_R_2, mode=Mode.SUBTRACT)
    # profile 2 of 2: a face of its own
    with BuildSketch(Plane.XY.offset(SPLIT2_START_2)):
        with Locations((-34.926329237, 25)):
            Circle(SPLIT2_4_OUTLINE_R_3)
    extrude(amount=SPLIT2_4_DEPTH)

    # Split2 5 outline → Split2 5 (add)
    with BuildSketch(Plane.XY.offset(SPLIT2_START_3)):
        with Locations((-34.926329237, 25)):
            Circle(SPLIT2_5_OUTLINE_R)
        with Locations((-34.926329237, 25)):
            Circle(SPLIT2_5_OUTLINE_R_2, mode=Mode.SUBTRACT)
    extrude(amount=SPLIT2_5_DEPTH)


with BuildPart() as body_3_1:
    add(body_3.part)

    # Split2 6 outline → Split2 6 (cut)
    with BuildSketch(Plane.XY.offset(SPLIT2_START_2)):
        with Locations((-34.926329237, 25)):
            Circle(SPLIT2_6_OUTLINE_R)
    extrude(amount=SPLIT2_6_DEPTH, mode=Mode.SUBTRACT)


solid = Compound([part_1.part, body_2.part, body_4.part, body_5.part, body_6.part, body_3_1.part])
